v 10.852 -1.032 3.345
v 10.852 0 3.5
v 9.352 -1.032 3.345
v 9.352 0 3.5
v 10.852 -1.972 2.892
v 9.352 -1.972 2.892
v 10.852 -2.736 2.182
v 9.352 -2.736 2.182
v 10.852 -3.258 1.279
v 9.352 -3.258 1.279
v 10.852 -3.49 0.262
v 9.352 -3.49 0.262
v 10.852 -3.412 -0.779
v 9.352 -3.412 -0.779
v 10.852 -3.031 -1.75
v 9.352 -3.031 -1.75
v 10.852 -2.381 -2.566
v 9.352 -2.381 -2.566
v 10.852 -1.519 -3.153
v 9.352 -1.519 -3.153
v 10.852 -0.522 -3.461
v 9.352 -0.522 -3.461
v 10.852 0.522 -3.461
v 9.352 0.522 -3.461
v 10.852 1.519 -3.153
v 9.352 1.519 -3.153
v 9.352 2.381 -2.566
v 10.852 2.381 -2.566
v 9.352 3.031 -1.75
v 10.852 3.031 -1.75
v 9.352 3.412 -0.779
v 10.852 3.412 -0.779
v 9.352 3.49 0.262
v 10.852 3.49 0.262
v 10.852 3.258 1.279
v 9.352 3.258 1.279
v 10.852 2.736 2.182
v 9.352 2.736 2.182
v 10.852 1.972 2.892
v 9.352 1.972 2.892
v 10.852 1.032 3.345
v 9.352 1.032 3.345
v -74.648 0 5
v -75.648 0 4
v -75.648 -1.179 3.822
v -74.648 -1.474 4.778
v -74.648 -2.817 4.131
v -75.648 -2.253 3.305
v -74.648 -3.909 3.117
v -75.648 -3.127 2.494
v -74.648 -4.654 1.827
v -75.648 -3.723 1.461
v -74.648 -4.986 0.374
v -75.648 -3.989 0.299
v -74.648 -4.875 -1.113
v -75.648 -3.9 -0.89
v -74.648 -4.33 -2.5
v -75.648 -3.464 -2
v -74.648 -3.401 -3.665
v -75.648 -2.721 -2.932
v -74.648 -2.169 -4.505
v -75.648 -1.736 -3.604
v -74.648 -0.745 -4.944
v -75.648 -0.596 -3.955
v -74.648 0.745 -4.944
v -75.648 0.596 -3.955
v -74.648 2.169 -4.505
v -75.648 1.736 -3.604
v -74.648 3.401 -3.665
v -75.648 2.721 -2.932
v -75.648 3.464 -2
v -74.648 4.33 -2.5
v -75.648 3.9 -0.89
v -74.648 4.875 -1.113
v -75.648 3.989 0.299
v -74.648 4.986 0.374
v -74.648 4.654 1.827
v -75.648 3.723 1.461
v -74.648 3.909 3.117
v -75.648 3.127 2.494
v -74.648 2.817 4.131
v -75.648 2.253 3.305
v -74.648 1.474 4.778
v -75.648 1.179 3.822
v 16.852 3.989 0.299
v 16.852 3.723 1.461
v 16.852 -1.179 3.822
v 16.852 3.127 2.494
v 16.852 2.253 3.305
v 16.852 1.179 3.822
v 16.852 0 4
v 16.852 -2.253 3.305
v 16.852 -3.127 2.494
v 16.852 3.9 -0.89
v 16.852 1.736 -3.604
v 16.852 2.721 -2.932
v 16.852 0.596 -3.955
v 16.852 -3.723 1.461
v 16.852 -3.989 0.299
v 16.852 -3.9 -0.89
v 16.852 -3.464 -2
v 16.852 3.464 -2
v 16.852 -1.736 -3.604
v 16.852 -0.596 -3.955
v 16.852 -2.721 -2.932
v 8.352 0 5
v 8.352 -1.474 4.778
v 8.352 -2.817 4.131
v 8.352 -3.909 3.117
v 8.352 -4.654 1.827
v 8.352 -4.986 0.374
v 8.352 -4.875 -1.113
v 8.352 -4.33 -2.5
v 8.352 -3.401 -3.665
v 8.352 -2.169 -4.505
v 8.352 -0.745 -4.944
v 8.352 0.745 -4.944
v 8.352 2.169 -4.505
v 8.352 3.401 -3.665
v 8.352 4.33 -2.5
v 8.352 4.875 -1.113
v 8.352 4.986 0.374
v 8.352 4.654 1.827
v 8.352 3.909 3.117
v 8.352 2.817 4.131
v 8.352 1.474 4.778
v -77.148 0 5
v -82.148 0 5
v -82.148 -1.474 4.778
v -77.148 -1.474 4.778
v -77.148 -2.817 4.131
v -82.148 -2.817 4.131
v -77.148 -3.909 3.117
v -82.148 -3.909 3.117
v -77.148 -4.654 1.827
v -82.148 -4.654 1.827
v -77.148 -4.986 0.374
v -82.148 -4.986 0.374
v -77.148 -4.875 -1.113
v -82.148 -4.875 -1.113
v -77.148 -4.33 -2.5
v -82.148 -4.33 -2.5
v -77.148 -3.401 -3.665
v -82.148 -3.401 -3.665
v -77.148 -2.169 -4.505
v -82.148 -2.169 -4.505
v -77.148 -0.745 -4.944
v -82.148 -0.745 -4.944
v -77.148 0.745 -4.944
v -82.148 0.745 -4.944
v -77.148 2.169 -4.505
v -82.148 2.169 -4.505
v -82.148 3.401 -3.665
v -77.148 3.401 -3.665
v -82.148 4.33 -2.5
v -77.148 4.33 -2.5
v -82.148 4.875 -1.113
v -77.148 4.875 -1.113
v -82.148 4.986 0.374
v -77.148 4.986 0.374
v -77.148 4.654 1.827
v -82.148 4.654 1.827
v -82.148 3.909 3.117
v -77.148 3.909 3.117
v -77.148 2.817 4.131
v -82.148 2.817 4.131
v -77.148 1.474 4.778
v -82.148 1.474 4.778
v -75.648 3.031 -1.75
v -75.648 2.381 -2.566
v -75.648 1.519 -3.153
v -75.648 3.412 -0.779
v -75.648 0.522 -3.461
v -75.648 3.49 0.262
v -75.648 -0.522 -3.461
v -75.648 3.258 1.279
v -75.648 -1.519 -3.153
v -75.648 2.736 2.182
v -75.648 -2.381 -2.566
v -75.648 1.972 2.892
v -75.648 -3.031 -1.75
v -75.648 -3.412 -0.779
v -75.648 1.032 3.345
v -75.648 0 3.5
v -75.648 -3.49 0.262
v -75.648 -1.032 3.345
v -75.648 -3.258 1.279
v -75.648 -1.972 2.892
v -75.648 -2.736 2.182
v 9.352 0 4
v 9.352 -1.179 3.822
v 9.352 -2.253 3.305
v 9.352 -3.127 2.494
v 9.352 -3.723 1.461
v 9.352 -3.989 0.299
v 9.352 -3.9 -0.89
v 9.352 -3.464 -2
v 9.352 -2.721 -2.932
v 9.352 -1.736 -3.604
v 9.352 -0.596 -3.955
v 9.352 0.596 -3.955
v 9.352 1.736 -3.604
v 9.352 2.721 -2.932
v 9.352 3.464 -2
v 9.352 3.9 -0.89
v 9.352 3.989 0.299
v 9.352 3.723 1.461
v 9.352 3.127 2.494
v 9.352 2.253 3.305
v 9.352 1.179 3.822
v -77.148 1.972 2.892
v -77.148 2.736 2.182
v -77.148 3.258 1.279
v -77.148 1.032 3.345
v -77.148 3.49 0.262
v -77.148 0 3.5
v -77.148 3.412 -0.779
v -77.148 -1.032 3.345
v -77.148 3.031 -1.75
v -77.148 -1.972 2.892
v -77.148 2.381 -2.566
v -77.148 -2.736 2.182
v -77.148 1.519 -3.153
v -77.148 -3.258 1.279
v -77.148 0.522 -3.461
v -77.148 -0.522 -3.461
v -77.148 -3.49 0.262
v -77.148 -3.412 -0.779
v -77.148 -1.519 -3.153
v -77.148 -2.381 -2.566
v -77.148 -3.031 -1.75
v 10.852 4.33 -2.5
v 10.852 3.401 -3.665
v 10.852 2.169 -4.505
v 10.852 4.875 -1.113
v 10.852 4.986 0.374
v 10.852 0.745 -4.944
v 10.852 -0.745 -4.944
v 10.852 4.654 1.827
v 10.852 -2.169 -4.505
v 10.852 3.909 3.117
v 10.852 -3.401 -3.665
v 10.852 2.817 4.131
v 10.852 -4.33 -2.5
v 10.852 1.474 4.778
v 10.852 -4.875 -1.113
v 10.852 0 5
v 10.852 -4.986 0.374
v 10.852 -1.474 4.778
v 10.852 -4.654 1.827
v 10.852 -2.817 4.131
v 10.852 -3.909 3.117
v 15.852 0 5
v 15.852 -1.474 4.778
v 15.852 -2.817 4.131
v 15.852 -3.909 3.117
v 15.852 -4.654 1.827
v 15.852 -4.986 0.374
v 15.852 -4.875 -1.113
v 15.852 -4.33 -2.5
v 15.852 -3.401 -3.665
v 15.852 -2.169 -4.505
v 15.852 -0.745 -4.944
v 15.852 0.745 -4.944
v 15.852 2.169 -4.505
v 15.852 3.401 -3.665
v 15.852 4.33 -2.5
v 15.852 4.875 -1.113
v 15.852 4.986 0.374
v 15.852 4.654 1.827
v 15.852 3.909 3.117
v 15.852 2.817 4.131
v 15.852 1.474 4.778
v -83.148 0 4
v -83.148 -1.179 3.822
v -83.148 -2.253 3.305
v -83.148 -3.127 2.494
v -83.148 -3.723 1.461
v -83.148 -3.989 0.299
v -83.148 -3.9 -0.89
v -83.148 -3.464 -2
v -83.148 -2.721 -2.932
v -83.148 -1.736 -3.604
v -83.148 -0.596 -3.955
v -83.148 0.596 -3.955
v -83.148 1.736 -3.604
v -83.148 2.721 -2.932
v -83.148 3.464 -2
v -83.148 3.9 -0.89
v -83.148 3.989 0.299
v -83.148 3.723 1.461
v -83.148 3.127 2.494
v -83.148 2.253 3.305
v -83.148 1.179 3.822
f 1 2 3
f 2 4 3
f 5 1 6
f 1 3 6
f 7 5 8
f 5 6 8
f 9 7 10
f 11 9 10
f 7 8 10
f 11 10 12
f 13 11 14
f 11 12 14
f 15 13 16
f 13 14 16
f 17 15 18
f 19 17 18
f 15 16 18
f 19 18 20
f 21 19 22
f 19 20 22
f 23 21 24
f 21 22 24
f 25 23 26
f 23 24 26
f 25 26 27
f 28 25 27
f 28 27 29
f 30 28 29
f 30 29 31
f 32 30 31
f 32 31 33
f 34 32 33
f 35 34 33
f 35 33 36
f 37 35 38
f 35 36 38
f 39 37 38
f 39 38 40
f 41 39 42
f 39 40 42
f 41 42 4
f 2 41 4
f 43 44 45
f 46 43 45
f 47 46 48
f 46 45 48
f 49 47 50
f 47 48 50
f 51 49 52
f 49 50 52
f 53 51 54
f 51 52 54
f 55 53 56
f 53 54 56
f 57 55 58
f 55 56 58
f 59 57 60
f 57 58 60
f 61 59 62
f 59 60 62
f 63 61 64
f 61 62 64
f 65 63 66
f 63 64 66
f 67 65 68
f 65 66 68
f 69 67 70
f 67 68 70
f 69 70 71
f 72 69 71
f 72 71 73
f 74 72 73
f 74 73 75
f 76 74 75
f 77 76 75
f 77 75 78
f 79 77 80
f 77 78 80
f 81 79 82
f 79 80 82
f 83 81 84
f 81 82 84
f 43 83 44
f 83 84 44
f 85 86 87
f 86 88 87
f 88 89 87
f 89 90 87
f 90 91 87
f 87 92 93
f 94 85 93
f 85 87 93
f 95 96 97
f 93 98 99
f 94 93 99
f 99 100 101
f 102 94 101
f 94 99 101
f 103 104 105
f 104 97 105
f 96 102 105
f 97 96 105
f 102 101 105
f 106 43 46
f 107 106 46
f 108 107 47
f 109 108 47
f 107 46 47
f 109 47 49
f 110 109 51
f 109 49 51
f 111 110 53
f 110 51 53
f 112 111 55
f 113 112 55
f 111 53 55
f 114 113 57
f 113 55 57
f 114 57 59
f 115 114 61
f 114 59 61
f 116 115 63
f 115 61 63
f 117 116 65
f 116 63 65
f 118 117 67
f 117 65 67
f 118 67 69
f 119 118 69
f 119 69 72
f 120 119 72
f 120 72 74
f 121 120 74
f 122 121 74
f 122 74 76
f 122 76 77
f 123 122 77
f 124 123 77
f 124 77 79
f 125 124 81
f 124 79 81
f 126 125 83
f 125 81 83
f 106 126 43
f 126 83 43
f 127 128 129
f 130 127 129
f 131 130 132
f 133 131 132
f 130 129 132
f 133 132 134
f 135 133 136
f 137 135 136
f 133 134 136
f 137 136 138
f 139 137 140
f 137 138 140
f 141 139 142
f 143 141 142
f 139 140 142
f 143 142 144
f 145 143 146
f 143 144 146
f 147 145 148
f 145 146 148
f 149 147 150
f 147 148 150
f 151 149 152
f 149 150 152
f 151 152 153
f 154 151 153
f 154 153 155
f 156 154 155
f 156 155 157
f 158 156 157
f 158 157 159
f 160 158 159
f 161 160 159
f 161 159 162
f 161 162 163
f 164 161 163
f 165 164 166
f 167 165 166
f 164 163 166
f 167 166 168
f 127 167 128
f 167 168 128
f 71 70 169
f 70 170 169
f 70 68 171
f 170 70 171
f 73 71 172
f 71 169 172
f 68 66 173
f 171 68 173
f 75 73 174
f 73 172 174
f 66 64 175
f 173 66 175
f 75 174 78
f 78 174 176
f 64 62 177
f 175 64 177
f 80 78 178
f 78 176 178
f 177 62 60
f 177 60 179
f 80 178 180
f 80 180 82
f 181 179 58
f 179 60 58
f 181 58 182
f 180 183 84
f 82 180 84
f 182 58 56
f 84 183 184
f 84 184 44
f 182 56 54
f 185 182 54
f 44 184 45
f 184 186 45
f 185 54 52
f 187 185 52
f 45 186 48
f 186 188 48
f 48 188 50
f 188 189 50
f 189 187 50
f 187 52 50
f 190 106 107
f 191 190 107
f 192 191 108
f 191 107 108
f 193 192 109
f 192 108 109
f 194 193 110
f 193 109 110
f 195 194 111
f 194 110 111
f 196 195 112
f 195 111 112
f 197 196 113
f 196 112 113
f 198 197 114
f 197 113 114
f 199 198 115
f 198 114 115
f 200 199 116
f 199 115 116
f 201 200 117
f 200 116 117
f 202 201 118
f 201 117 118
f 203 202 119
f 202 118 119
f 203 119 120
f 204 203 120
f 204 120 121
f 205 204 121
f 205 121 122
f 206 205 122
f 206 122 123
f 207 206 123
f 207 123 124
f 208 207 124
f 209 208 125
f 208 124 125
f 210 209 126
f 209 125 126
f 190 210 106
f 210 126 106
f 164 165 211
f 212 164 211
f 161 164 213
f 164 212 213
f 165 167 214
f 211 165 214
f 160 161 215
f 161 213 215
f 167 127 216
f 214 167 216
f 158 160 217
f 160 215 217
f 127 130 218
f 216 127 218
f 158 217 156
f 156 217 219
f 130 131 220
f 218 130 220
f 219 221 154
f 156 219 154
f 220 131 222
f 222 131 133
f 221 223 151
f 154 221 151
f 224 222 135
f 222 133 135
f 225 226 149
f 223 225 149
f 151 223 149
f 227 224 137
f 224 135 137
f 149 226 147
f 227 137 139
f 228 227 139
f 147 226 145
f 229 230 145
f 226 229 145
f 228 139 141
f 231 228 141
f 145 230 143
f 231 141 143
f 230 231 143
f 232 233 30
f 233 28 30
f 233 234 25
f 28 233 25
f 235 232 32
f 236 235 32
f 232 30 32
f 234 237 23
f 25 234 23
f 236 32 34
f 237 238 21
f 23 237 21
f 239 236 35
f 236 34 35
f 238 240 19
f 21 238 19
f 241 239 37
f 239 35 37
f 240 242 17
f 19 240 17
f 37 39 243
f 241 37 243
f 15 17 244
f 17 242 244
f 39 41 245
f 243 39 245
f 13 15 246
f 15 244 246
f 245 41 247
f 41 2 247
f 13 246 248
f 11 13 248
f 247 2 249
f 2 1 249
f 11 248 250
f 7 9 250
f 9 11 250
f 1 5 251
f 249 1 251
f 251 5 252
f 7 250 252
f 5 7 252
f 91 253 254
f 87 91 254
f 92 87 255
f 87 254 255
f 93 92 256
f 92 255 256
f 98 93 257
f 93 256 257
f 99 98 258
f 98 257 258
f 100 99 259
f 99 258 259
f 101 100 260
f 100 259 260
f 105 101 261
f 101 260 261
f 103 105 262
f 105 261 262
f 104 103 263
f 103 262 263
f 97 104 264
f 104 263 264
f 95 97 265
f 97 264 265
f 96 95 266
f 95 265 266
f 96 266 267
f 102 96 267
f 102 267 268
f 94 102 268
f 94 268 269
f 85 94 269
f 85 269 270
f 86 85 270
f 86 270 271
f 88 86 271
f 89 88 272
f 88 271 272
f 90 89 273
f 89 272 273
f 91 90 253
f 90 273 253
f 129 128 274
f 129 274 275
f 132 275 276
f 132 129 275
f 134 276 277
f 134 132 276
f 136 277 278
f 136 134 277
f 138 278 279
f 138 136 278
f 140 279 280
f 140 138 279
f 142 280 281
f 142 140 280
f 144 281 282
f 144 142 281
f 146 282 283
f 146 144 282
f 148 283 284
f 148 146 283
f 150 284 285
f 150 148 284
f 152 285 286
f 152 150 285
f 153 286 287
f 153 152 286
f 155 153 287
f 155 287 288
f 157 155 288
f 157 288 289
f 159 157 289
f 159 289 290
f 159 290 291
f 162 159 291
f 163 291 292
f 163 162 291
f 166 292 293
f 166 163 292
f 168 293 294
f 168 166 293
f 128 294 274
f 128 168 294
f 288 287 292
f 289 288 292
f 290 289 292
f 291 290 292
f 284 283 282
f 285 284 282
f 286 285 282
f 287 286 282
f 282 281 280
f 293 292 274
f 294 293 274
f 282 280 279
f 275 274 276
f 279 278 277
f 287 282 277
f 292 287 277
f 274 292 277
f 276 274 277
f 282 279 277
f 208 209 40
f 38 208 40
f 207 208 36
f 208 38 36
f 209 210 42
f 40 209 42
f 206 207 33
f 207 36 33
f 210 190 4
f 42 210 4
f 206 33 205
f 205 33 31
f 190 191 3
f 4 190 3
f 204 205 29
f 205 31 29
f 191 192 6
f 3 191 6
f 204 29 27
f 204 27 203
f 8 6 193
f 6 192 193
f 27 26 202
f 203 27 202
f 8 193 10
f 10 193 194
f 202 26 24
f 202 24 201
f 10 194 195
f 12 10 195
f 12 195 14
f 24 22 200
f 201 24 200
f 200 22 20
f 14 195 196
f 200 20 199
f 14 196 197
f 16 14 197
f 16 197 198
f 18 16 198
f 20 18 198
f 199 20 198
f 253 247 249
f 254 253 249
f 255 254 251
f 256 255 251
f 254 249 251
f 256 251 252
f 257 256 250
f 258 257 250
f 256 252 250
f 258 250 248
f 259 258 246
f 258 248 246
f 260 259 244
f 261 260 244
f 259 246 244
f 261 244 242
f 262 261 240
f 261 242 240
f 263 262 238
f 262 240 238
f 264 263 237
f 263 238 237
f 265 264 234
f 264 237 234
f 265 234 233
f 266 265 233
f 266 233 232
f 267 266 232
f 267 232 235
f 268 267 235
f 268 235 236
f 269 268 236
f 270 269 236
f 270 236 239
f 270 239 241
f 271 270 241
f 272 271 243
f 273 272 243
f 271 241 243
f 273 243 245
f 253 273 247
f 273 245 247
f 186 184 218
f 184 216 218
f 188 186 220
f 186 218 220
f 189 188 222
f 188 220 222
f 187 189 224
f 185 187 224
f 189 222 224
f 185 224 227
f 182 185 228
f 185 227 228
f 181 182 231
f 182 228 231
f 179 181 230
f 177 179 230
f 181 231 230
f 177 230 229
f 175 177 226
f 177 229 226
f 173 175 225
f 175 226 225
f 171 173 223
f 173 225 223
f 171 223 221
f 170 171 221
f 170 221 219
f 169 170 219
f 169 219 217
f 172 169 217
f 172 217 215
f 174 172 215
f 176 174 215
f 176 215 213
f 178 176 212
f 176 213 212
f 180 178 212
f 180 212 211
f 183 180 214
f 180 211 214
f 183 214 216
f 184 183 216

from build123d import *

# Parameters (mm, degrees)
F2_SIZE = 1


with BuildPart() as f1:
    # F0 (on Front) → F1 (revolve)
    with BuildSketch(Plane.XZ):
        Polygon((-83.14801, 5), (-83.14801, 0), (16.85199, 0), (16.85199, 5), (10.85199, 5), (10.85199, 3.5), (9.35199, 3.5), (9.35199, 5), (-75.64801, 5), (-75.64801, 3.5), (-77.14801, 3.5), (-77.14801, 5), align=None)
    revolve(axis=Axis((-33.14801, 0, 0), (1, 0, 0)))

    # F2
    f2_edges = [f1.edges().sort_by_distance(p)[0] for p in [
        (-83.14801, 0, -5),
        (-75.64801, 0, -5),
        (16.85199, 0, -5),
        (9.35199, 0, -5),
    ]]
    chamfer(f2_edges, length=F2_SIZE)


solid = f1.part
